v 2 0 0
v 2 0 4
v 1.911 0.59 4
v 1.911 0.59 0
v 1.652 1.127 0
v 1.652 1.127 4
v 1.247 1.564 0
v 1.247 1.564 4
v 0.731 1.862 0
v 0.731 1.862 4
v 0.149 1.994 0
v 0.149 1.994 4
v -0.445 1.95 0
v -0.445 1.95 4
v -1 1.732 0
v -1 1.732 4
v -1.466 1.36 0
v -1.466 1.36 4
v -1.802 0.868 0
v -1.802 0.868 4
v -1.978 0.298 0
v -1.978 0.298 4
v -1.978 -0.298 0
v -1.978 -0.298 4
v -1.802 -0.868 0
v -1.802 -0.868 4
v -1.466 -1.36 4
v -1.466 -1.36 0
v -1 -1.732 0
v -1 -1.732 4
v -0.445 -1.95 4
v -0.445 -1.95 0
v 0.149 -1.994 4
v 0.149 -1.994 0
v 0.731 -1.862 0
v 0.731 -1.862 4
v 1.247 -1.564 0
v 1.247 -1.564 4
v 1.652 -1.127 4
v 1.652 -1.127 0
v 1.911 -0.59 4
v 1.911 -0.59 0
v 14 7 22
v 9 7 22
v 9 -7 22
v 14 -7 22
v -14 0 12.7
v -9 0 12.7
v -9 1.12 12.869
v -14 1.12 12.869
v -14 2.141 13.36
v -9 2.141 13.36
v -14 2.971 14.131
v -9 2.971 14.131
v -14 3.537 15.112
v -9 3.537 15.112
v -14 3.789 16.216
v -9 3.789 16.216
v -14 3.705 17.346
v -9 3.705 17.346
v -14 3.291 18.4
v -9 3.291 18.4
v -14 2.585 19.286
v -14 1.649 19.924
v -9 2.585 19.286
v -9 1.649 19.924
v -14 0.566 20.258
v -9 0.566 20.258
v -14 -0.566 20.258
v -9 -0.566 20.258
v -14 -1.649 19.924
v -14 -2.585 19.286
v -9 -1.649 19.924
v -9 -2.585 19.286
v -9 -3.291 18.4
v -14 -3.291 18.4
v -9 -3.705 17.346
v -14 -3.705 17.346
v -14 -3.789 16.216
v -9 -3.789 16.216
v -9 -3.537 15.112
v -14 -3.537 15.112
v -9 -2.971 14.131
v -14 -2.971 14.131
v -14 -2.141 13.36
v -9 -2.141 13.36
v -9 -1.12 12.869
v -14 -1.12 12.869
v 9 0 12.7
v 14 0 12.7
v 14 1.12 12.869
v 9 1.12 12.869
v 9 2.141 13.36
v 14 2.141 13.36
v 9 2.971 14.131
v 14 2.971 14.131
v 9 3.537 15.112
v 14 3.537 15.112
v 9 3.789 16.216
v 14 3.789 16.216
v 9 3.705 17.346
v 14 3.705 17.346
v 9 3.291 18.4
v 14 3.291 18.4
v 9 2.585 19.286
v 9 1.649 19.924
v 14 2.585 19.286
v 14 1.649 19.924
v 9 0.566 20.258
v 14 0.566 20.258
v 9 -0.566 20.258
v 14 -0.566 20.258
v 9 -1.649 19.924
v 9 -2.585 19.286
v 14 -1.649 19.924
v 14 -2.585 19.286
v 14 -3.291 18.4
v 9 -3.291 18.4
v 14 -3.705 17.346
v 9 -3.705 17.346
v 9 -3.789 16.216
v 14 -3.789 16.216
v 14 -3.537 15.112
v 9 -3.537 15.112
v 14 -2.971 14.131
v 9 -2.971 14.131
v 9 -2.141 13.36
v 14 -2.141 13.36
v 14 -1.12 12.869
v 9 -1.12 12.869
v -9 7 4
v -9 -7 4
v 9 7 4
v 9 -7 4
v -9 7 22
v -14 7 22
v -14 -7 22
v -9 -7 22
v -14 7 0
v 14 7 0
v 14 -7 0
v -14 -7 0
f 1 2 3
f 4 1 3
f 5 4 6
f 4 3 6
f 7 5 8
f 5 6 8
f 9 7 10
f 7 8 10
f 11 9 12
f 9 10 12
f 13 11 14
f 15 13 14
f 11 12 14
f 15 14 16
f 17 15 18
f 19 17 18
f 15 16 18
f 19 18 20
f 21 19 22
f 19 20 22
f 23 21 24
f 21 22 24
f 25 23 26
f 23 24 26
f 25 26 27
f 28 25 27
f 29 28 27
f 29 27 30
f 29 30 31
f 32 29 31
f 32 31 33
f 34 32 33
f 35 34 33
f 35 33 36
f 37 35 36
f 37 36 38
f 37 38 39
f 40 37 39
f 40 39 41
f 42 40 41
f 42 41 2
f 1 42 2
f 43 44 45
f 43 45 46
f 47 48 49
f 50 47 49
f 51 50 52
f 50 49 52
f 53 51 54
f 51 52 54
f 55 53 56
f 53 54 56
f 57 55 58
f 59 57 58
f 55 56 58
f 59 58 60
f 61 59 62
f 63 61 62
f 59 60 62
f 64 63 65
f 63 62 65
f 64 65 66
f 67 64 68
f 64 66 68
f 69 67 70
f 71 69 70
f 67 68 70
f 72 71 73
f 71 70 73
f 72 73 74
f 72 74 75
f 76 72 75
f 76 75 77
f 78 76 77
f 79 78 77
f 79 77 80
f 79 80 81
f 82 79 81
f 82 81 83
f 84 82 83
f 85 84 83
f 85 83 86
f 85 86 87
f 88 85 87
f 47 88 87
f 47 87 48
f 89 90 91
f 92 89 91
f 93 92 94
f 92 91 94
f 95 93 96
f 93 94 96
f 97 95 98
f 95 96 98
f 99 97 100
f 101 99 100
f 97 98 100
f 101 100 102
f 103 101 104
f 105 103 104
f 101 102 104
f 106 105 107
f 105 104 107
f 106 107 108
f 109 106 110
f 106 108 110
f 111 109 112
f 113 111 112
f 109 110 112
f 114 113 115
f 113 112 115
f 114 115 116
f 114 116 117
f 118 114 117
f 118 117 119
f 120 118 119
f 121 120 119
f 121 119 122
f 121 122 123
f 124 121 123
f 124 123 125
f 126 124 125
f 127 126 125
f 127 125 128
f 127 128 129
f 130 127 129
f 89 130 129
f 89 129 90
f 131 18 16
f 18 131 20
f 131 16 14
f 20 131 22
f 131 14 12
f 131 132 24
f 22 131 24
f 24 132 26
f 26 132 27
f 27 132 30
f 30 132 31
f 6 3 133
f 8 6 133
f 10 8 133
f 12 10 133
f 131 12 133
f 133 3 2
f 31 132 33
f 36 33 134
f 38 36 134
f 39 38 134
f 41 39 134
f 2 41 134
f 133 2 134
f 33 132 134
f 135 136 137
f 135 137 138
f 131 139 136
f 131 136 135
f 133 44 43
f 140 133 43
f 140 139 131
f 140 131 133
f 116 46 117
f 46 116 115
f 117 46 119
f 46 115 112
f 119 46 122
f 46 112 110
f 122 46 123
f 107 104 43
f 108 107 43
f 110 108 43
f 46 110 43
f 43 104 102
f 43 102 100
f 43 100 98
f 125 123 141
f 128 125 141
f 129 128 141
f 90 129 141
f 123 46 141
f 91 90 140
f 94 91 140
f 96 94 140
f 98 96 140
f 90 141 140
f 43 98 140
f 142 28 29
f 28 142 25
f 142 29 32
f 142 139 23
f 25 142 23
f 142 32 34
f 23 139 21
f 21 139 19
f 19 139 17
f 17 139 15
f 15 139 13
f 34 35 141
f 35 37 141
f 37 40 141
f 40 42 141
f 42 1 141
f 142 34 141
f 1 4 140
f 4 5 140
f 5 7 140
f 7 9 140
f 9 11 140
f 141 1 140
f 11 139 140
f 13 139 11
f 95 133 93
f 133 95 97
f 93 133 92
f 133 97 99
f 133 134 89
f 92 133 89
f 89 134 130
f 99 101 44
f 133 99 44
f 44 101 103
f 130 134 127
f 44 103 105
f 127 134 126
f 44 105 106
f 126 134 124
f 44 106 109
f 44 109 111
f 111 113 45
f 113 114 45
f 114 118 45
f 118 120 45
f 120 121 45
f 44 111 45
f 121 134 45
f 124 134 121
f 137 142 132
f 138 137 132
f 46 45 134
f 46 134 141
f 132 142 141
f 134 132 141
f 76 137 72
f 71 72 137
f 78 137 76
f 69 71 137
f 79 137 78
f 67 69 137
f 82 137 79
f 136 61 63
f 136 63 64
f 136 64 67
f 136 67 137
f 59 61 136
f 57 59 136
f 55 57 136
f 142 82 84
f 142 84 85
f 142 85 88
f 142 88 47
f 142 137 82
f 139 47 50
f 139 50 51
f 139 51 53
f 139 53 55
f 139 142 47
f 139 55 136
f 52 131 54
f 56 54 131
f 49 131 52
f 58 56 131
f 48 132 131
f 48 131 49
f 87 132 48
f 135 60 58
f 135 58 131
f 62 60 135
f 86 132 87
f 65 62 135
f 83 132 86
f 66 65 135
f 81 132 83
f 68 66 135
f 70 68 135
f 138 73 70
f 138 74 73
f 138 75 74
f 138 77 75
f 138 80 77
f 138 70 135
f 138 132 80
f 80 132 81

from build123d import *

# Parameters (mm, degrees)
SKETCH_1_W          = 28
SKETCH_1_H          = 14
EXTRUDE_1_DEPTH     = 22
SKETCH_2_W          = 18
SKETCH_2_H          = 18
CUT_EXTRUDE_1_DEPTH = 22
SKETCH_3_R          = 3.8
CUT_EXTRUDE_2_DEPTH = 29
SKETCH_4_R          = 2
CUT_EXTRUDE_3_DEPTH = 29


with BuildPart() as part:
    # Эскиз1 → Бобышка-Вытянуть1 (new body)
    with BuildSketch(Plane.XY):
        Rectangle(SKETCH_1_W, SKETCH_1_H)
    extrude(amount=EXTRUDE_1_DEPTH)

    # Эскиз2 → Вырез-Вытянуть1 (cut)
    with BuildSketch(Plane.XZ.offset(7)):
        with Locations((0, 13)):
            Rectangle(SKETCH_2_W, SKETCH_2_H)
    extrude(amount=-CUT_EXTRUDE_1_DEPTH, mode=Mode.SUBTRACT)

    # Эскиз3 → Вырез-Вытянуть2 (cut)
    with BuildSketch(Plane(origin=(14, 0, 0), x_dir=(0, 0, -1), z_dir=(1, 0, 0))):
        with Locations((-16.5, 0)):
            Circle(SKETCH_3_R)
    extrude(amount=-CUT_EXTRUDE_2_DEPTH, mode=Mode.SUBTRACT)

    # Эскиз4 → Вырез-Вытянуть3 (cut)
    with BuildSketch(Plane.XY.offset(4)):
        Circle(SKETCH_4_R)
    extrude(amount=-CUT_EXTRUDE_3_DEPTH, mode=Mode.SUBTRACT)


solid = part.part
